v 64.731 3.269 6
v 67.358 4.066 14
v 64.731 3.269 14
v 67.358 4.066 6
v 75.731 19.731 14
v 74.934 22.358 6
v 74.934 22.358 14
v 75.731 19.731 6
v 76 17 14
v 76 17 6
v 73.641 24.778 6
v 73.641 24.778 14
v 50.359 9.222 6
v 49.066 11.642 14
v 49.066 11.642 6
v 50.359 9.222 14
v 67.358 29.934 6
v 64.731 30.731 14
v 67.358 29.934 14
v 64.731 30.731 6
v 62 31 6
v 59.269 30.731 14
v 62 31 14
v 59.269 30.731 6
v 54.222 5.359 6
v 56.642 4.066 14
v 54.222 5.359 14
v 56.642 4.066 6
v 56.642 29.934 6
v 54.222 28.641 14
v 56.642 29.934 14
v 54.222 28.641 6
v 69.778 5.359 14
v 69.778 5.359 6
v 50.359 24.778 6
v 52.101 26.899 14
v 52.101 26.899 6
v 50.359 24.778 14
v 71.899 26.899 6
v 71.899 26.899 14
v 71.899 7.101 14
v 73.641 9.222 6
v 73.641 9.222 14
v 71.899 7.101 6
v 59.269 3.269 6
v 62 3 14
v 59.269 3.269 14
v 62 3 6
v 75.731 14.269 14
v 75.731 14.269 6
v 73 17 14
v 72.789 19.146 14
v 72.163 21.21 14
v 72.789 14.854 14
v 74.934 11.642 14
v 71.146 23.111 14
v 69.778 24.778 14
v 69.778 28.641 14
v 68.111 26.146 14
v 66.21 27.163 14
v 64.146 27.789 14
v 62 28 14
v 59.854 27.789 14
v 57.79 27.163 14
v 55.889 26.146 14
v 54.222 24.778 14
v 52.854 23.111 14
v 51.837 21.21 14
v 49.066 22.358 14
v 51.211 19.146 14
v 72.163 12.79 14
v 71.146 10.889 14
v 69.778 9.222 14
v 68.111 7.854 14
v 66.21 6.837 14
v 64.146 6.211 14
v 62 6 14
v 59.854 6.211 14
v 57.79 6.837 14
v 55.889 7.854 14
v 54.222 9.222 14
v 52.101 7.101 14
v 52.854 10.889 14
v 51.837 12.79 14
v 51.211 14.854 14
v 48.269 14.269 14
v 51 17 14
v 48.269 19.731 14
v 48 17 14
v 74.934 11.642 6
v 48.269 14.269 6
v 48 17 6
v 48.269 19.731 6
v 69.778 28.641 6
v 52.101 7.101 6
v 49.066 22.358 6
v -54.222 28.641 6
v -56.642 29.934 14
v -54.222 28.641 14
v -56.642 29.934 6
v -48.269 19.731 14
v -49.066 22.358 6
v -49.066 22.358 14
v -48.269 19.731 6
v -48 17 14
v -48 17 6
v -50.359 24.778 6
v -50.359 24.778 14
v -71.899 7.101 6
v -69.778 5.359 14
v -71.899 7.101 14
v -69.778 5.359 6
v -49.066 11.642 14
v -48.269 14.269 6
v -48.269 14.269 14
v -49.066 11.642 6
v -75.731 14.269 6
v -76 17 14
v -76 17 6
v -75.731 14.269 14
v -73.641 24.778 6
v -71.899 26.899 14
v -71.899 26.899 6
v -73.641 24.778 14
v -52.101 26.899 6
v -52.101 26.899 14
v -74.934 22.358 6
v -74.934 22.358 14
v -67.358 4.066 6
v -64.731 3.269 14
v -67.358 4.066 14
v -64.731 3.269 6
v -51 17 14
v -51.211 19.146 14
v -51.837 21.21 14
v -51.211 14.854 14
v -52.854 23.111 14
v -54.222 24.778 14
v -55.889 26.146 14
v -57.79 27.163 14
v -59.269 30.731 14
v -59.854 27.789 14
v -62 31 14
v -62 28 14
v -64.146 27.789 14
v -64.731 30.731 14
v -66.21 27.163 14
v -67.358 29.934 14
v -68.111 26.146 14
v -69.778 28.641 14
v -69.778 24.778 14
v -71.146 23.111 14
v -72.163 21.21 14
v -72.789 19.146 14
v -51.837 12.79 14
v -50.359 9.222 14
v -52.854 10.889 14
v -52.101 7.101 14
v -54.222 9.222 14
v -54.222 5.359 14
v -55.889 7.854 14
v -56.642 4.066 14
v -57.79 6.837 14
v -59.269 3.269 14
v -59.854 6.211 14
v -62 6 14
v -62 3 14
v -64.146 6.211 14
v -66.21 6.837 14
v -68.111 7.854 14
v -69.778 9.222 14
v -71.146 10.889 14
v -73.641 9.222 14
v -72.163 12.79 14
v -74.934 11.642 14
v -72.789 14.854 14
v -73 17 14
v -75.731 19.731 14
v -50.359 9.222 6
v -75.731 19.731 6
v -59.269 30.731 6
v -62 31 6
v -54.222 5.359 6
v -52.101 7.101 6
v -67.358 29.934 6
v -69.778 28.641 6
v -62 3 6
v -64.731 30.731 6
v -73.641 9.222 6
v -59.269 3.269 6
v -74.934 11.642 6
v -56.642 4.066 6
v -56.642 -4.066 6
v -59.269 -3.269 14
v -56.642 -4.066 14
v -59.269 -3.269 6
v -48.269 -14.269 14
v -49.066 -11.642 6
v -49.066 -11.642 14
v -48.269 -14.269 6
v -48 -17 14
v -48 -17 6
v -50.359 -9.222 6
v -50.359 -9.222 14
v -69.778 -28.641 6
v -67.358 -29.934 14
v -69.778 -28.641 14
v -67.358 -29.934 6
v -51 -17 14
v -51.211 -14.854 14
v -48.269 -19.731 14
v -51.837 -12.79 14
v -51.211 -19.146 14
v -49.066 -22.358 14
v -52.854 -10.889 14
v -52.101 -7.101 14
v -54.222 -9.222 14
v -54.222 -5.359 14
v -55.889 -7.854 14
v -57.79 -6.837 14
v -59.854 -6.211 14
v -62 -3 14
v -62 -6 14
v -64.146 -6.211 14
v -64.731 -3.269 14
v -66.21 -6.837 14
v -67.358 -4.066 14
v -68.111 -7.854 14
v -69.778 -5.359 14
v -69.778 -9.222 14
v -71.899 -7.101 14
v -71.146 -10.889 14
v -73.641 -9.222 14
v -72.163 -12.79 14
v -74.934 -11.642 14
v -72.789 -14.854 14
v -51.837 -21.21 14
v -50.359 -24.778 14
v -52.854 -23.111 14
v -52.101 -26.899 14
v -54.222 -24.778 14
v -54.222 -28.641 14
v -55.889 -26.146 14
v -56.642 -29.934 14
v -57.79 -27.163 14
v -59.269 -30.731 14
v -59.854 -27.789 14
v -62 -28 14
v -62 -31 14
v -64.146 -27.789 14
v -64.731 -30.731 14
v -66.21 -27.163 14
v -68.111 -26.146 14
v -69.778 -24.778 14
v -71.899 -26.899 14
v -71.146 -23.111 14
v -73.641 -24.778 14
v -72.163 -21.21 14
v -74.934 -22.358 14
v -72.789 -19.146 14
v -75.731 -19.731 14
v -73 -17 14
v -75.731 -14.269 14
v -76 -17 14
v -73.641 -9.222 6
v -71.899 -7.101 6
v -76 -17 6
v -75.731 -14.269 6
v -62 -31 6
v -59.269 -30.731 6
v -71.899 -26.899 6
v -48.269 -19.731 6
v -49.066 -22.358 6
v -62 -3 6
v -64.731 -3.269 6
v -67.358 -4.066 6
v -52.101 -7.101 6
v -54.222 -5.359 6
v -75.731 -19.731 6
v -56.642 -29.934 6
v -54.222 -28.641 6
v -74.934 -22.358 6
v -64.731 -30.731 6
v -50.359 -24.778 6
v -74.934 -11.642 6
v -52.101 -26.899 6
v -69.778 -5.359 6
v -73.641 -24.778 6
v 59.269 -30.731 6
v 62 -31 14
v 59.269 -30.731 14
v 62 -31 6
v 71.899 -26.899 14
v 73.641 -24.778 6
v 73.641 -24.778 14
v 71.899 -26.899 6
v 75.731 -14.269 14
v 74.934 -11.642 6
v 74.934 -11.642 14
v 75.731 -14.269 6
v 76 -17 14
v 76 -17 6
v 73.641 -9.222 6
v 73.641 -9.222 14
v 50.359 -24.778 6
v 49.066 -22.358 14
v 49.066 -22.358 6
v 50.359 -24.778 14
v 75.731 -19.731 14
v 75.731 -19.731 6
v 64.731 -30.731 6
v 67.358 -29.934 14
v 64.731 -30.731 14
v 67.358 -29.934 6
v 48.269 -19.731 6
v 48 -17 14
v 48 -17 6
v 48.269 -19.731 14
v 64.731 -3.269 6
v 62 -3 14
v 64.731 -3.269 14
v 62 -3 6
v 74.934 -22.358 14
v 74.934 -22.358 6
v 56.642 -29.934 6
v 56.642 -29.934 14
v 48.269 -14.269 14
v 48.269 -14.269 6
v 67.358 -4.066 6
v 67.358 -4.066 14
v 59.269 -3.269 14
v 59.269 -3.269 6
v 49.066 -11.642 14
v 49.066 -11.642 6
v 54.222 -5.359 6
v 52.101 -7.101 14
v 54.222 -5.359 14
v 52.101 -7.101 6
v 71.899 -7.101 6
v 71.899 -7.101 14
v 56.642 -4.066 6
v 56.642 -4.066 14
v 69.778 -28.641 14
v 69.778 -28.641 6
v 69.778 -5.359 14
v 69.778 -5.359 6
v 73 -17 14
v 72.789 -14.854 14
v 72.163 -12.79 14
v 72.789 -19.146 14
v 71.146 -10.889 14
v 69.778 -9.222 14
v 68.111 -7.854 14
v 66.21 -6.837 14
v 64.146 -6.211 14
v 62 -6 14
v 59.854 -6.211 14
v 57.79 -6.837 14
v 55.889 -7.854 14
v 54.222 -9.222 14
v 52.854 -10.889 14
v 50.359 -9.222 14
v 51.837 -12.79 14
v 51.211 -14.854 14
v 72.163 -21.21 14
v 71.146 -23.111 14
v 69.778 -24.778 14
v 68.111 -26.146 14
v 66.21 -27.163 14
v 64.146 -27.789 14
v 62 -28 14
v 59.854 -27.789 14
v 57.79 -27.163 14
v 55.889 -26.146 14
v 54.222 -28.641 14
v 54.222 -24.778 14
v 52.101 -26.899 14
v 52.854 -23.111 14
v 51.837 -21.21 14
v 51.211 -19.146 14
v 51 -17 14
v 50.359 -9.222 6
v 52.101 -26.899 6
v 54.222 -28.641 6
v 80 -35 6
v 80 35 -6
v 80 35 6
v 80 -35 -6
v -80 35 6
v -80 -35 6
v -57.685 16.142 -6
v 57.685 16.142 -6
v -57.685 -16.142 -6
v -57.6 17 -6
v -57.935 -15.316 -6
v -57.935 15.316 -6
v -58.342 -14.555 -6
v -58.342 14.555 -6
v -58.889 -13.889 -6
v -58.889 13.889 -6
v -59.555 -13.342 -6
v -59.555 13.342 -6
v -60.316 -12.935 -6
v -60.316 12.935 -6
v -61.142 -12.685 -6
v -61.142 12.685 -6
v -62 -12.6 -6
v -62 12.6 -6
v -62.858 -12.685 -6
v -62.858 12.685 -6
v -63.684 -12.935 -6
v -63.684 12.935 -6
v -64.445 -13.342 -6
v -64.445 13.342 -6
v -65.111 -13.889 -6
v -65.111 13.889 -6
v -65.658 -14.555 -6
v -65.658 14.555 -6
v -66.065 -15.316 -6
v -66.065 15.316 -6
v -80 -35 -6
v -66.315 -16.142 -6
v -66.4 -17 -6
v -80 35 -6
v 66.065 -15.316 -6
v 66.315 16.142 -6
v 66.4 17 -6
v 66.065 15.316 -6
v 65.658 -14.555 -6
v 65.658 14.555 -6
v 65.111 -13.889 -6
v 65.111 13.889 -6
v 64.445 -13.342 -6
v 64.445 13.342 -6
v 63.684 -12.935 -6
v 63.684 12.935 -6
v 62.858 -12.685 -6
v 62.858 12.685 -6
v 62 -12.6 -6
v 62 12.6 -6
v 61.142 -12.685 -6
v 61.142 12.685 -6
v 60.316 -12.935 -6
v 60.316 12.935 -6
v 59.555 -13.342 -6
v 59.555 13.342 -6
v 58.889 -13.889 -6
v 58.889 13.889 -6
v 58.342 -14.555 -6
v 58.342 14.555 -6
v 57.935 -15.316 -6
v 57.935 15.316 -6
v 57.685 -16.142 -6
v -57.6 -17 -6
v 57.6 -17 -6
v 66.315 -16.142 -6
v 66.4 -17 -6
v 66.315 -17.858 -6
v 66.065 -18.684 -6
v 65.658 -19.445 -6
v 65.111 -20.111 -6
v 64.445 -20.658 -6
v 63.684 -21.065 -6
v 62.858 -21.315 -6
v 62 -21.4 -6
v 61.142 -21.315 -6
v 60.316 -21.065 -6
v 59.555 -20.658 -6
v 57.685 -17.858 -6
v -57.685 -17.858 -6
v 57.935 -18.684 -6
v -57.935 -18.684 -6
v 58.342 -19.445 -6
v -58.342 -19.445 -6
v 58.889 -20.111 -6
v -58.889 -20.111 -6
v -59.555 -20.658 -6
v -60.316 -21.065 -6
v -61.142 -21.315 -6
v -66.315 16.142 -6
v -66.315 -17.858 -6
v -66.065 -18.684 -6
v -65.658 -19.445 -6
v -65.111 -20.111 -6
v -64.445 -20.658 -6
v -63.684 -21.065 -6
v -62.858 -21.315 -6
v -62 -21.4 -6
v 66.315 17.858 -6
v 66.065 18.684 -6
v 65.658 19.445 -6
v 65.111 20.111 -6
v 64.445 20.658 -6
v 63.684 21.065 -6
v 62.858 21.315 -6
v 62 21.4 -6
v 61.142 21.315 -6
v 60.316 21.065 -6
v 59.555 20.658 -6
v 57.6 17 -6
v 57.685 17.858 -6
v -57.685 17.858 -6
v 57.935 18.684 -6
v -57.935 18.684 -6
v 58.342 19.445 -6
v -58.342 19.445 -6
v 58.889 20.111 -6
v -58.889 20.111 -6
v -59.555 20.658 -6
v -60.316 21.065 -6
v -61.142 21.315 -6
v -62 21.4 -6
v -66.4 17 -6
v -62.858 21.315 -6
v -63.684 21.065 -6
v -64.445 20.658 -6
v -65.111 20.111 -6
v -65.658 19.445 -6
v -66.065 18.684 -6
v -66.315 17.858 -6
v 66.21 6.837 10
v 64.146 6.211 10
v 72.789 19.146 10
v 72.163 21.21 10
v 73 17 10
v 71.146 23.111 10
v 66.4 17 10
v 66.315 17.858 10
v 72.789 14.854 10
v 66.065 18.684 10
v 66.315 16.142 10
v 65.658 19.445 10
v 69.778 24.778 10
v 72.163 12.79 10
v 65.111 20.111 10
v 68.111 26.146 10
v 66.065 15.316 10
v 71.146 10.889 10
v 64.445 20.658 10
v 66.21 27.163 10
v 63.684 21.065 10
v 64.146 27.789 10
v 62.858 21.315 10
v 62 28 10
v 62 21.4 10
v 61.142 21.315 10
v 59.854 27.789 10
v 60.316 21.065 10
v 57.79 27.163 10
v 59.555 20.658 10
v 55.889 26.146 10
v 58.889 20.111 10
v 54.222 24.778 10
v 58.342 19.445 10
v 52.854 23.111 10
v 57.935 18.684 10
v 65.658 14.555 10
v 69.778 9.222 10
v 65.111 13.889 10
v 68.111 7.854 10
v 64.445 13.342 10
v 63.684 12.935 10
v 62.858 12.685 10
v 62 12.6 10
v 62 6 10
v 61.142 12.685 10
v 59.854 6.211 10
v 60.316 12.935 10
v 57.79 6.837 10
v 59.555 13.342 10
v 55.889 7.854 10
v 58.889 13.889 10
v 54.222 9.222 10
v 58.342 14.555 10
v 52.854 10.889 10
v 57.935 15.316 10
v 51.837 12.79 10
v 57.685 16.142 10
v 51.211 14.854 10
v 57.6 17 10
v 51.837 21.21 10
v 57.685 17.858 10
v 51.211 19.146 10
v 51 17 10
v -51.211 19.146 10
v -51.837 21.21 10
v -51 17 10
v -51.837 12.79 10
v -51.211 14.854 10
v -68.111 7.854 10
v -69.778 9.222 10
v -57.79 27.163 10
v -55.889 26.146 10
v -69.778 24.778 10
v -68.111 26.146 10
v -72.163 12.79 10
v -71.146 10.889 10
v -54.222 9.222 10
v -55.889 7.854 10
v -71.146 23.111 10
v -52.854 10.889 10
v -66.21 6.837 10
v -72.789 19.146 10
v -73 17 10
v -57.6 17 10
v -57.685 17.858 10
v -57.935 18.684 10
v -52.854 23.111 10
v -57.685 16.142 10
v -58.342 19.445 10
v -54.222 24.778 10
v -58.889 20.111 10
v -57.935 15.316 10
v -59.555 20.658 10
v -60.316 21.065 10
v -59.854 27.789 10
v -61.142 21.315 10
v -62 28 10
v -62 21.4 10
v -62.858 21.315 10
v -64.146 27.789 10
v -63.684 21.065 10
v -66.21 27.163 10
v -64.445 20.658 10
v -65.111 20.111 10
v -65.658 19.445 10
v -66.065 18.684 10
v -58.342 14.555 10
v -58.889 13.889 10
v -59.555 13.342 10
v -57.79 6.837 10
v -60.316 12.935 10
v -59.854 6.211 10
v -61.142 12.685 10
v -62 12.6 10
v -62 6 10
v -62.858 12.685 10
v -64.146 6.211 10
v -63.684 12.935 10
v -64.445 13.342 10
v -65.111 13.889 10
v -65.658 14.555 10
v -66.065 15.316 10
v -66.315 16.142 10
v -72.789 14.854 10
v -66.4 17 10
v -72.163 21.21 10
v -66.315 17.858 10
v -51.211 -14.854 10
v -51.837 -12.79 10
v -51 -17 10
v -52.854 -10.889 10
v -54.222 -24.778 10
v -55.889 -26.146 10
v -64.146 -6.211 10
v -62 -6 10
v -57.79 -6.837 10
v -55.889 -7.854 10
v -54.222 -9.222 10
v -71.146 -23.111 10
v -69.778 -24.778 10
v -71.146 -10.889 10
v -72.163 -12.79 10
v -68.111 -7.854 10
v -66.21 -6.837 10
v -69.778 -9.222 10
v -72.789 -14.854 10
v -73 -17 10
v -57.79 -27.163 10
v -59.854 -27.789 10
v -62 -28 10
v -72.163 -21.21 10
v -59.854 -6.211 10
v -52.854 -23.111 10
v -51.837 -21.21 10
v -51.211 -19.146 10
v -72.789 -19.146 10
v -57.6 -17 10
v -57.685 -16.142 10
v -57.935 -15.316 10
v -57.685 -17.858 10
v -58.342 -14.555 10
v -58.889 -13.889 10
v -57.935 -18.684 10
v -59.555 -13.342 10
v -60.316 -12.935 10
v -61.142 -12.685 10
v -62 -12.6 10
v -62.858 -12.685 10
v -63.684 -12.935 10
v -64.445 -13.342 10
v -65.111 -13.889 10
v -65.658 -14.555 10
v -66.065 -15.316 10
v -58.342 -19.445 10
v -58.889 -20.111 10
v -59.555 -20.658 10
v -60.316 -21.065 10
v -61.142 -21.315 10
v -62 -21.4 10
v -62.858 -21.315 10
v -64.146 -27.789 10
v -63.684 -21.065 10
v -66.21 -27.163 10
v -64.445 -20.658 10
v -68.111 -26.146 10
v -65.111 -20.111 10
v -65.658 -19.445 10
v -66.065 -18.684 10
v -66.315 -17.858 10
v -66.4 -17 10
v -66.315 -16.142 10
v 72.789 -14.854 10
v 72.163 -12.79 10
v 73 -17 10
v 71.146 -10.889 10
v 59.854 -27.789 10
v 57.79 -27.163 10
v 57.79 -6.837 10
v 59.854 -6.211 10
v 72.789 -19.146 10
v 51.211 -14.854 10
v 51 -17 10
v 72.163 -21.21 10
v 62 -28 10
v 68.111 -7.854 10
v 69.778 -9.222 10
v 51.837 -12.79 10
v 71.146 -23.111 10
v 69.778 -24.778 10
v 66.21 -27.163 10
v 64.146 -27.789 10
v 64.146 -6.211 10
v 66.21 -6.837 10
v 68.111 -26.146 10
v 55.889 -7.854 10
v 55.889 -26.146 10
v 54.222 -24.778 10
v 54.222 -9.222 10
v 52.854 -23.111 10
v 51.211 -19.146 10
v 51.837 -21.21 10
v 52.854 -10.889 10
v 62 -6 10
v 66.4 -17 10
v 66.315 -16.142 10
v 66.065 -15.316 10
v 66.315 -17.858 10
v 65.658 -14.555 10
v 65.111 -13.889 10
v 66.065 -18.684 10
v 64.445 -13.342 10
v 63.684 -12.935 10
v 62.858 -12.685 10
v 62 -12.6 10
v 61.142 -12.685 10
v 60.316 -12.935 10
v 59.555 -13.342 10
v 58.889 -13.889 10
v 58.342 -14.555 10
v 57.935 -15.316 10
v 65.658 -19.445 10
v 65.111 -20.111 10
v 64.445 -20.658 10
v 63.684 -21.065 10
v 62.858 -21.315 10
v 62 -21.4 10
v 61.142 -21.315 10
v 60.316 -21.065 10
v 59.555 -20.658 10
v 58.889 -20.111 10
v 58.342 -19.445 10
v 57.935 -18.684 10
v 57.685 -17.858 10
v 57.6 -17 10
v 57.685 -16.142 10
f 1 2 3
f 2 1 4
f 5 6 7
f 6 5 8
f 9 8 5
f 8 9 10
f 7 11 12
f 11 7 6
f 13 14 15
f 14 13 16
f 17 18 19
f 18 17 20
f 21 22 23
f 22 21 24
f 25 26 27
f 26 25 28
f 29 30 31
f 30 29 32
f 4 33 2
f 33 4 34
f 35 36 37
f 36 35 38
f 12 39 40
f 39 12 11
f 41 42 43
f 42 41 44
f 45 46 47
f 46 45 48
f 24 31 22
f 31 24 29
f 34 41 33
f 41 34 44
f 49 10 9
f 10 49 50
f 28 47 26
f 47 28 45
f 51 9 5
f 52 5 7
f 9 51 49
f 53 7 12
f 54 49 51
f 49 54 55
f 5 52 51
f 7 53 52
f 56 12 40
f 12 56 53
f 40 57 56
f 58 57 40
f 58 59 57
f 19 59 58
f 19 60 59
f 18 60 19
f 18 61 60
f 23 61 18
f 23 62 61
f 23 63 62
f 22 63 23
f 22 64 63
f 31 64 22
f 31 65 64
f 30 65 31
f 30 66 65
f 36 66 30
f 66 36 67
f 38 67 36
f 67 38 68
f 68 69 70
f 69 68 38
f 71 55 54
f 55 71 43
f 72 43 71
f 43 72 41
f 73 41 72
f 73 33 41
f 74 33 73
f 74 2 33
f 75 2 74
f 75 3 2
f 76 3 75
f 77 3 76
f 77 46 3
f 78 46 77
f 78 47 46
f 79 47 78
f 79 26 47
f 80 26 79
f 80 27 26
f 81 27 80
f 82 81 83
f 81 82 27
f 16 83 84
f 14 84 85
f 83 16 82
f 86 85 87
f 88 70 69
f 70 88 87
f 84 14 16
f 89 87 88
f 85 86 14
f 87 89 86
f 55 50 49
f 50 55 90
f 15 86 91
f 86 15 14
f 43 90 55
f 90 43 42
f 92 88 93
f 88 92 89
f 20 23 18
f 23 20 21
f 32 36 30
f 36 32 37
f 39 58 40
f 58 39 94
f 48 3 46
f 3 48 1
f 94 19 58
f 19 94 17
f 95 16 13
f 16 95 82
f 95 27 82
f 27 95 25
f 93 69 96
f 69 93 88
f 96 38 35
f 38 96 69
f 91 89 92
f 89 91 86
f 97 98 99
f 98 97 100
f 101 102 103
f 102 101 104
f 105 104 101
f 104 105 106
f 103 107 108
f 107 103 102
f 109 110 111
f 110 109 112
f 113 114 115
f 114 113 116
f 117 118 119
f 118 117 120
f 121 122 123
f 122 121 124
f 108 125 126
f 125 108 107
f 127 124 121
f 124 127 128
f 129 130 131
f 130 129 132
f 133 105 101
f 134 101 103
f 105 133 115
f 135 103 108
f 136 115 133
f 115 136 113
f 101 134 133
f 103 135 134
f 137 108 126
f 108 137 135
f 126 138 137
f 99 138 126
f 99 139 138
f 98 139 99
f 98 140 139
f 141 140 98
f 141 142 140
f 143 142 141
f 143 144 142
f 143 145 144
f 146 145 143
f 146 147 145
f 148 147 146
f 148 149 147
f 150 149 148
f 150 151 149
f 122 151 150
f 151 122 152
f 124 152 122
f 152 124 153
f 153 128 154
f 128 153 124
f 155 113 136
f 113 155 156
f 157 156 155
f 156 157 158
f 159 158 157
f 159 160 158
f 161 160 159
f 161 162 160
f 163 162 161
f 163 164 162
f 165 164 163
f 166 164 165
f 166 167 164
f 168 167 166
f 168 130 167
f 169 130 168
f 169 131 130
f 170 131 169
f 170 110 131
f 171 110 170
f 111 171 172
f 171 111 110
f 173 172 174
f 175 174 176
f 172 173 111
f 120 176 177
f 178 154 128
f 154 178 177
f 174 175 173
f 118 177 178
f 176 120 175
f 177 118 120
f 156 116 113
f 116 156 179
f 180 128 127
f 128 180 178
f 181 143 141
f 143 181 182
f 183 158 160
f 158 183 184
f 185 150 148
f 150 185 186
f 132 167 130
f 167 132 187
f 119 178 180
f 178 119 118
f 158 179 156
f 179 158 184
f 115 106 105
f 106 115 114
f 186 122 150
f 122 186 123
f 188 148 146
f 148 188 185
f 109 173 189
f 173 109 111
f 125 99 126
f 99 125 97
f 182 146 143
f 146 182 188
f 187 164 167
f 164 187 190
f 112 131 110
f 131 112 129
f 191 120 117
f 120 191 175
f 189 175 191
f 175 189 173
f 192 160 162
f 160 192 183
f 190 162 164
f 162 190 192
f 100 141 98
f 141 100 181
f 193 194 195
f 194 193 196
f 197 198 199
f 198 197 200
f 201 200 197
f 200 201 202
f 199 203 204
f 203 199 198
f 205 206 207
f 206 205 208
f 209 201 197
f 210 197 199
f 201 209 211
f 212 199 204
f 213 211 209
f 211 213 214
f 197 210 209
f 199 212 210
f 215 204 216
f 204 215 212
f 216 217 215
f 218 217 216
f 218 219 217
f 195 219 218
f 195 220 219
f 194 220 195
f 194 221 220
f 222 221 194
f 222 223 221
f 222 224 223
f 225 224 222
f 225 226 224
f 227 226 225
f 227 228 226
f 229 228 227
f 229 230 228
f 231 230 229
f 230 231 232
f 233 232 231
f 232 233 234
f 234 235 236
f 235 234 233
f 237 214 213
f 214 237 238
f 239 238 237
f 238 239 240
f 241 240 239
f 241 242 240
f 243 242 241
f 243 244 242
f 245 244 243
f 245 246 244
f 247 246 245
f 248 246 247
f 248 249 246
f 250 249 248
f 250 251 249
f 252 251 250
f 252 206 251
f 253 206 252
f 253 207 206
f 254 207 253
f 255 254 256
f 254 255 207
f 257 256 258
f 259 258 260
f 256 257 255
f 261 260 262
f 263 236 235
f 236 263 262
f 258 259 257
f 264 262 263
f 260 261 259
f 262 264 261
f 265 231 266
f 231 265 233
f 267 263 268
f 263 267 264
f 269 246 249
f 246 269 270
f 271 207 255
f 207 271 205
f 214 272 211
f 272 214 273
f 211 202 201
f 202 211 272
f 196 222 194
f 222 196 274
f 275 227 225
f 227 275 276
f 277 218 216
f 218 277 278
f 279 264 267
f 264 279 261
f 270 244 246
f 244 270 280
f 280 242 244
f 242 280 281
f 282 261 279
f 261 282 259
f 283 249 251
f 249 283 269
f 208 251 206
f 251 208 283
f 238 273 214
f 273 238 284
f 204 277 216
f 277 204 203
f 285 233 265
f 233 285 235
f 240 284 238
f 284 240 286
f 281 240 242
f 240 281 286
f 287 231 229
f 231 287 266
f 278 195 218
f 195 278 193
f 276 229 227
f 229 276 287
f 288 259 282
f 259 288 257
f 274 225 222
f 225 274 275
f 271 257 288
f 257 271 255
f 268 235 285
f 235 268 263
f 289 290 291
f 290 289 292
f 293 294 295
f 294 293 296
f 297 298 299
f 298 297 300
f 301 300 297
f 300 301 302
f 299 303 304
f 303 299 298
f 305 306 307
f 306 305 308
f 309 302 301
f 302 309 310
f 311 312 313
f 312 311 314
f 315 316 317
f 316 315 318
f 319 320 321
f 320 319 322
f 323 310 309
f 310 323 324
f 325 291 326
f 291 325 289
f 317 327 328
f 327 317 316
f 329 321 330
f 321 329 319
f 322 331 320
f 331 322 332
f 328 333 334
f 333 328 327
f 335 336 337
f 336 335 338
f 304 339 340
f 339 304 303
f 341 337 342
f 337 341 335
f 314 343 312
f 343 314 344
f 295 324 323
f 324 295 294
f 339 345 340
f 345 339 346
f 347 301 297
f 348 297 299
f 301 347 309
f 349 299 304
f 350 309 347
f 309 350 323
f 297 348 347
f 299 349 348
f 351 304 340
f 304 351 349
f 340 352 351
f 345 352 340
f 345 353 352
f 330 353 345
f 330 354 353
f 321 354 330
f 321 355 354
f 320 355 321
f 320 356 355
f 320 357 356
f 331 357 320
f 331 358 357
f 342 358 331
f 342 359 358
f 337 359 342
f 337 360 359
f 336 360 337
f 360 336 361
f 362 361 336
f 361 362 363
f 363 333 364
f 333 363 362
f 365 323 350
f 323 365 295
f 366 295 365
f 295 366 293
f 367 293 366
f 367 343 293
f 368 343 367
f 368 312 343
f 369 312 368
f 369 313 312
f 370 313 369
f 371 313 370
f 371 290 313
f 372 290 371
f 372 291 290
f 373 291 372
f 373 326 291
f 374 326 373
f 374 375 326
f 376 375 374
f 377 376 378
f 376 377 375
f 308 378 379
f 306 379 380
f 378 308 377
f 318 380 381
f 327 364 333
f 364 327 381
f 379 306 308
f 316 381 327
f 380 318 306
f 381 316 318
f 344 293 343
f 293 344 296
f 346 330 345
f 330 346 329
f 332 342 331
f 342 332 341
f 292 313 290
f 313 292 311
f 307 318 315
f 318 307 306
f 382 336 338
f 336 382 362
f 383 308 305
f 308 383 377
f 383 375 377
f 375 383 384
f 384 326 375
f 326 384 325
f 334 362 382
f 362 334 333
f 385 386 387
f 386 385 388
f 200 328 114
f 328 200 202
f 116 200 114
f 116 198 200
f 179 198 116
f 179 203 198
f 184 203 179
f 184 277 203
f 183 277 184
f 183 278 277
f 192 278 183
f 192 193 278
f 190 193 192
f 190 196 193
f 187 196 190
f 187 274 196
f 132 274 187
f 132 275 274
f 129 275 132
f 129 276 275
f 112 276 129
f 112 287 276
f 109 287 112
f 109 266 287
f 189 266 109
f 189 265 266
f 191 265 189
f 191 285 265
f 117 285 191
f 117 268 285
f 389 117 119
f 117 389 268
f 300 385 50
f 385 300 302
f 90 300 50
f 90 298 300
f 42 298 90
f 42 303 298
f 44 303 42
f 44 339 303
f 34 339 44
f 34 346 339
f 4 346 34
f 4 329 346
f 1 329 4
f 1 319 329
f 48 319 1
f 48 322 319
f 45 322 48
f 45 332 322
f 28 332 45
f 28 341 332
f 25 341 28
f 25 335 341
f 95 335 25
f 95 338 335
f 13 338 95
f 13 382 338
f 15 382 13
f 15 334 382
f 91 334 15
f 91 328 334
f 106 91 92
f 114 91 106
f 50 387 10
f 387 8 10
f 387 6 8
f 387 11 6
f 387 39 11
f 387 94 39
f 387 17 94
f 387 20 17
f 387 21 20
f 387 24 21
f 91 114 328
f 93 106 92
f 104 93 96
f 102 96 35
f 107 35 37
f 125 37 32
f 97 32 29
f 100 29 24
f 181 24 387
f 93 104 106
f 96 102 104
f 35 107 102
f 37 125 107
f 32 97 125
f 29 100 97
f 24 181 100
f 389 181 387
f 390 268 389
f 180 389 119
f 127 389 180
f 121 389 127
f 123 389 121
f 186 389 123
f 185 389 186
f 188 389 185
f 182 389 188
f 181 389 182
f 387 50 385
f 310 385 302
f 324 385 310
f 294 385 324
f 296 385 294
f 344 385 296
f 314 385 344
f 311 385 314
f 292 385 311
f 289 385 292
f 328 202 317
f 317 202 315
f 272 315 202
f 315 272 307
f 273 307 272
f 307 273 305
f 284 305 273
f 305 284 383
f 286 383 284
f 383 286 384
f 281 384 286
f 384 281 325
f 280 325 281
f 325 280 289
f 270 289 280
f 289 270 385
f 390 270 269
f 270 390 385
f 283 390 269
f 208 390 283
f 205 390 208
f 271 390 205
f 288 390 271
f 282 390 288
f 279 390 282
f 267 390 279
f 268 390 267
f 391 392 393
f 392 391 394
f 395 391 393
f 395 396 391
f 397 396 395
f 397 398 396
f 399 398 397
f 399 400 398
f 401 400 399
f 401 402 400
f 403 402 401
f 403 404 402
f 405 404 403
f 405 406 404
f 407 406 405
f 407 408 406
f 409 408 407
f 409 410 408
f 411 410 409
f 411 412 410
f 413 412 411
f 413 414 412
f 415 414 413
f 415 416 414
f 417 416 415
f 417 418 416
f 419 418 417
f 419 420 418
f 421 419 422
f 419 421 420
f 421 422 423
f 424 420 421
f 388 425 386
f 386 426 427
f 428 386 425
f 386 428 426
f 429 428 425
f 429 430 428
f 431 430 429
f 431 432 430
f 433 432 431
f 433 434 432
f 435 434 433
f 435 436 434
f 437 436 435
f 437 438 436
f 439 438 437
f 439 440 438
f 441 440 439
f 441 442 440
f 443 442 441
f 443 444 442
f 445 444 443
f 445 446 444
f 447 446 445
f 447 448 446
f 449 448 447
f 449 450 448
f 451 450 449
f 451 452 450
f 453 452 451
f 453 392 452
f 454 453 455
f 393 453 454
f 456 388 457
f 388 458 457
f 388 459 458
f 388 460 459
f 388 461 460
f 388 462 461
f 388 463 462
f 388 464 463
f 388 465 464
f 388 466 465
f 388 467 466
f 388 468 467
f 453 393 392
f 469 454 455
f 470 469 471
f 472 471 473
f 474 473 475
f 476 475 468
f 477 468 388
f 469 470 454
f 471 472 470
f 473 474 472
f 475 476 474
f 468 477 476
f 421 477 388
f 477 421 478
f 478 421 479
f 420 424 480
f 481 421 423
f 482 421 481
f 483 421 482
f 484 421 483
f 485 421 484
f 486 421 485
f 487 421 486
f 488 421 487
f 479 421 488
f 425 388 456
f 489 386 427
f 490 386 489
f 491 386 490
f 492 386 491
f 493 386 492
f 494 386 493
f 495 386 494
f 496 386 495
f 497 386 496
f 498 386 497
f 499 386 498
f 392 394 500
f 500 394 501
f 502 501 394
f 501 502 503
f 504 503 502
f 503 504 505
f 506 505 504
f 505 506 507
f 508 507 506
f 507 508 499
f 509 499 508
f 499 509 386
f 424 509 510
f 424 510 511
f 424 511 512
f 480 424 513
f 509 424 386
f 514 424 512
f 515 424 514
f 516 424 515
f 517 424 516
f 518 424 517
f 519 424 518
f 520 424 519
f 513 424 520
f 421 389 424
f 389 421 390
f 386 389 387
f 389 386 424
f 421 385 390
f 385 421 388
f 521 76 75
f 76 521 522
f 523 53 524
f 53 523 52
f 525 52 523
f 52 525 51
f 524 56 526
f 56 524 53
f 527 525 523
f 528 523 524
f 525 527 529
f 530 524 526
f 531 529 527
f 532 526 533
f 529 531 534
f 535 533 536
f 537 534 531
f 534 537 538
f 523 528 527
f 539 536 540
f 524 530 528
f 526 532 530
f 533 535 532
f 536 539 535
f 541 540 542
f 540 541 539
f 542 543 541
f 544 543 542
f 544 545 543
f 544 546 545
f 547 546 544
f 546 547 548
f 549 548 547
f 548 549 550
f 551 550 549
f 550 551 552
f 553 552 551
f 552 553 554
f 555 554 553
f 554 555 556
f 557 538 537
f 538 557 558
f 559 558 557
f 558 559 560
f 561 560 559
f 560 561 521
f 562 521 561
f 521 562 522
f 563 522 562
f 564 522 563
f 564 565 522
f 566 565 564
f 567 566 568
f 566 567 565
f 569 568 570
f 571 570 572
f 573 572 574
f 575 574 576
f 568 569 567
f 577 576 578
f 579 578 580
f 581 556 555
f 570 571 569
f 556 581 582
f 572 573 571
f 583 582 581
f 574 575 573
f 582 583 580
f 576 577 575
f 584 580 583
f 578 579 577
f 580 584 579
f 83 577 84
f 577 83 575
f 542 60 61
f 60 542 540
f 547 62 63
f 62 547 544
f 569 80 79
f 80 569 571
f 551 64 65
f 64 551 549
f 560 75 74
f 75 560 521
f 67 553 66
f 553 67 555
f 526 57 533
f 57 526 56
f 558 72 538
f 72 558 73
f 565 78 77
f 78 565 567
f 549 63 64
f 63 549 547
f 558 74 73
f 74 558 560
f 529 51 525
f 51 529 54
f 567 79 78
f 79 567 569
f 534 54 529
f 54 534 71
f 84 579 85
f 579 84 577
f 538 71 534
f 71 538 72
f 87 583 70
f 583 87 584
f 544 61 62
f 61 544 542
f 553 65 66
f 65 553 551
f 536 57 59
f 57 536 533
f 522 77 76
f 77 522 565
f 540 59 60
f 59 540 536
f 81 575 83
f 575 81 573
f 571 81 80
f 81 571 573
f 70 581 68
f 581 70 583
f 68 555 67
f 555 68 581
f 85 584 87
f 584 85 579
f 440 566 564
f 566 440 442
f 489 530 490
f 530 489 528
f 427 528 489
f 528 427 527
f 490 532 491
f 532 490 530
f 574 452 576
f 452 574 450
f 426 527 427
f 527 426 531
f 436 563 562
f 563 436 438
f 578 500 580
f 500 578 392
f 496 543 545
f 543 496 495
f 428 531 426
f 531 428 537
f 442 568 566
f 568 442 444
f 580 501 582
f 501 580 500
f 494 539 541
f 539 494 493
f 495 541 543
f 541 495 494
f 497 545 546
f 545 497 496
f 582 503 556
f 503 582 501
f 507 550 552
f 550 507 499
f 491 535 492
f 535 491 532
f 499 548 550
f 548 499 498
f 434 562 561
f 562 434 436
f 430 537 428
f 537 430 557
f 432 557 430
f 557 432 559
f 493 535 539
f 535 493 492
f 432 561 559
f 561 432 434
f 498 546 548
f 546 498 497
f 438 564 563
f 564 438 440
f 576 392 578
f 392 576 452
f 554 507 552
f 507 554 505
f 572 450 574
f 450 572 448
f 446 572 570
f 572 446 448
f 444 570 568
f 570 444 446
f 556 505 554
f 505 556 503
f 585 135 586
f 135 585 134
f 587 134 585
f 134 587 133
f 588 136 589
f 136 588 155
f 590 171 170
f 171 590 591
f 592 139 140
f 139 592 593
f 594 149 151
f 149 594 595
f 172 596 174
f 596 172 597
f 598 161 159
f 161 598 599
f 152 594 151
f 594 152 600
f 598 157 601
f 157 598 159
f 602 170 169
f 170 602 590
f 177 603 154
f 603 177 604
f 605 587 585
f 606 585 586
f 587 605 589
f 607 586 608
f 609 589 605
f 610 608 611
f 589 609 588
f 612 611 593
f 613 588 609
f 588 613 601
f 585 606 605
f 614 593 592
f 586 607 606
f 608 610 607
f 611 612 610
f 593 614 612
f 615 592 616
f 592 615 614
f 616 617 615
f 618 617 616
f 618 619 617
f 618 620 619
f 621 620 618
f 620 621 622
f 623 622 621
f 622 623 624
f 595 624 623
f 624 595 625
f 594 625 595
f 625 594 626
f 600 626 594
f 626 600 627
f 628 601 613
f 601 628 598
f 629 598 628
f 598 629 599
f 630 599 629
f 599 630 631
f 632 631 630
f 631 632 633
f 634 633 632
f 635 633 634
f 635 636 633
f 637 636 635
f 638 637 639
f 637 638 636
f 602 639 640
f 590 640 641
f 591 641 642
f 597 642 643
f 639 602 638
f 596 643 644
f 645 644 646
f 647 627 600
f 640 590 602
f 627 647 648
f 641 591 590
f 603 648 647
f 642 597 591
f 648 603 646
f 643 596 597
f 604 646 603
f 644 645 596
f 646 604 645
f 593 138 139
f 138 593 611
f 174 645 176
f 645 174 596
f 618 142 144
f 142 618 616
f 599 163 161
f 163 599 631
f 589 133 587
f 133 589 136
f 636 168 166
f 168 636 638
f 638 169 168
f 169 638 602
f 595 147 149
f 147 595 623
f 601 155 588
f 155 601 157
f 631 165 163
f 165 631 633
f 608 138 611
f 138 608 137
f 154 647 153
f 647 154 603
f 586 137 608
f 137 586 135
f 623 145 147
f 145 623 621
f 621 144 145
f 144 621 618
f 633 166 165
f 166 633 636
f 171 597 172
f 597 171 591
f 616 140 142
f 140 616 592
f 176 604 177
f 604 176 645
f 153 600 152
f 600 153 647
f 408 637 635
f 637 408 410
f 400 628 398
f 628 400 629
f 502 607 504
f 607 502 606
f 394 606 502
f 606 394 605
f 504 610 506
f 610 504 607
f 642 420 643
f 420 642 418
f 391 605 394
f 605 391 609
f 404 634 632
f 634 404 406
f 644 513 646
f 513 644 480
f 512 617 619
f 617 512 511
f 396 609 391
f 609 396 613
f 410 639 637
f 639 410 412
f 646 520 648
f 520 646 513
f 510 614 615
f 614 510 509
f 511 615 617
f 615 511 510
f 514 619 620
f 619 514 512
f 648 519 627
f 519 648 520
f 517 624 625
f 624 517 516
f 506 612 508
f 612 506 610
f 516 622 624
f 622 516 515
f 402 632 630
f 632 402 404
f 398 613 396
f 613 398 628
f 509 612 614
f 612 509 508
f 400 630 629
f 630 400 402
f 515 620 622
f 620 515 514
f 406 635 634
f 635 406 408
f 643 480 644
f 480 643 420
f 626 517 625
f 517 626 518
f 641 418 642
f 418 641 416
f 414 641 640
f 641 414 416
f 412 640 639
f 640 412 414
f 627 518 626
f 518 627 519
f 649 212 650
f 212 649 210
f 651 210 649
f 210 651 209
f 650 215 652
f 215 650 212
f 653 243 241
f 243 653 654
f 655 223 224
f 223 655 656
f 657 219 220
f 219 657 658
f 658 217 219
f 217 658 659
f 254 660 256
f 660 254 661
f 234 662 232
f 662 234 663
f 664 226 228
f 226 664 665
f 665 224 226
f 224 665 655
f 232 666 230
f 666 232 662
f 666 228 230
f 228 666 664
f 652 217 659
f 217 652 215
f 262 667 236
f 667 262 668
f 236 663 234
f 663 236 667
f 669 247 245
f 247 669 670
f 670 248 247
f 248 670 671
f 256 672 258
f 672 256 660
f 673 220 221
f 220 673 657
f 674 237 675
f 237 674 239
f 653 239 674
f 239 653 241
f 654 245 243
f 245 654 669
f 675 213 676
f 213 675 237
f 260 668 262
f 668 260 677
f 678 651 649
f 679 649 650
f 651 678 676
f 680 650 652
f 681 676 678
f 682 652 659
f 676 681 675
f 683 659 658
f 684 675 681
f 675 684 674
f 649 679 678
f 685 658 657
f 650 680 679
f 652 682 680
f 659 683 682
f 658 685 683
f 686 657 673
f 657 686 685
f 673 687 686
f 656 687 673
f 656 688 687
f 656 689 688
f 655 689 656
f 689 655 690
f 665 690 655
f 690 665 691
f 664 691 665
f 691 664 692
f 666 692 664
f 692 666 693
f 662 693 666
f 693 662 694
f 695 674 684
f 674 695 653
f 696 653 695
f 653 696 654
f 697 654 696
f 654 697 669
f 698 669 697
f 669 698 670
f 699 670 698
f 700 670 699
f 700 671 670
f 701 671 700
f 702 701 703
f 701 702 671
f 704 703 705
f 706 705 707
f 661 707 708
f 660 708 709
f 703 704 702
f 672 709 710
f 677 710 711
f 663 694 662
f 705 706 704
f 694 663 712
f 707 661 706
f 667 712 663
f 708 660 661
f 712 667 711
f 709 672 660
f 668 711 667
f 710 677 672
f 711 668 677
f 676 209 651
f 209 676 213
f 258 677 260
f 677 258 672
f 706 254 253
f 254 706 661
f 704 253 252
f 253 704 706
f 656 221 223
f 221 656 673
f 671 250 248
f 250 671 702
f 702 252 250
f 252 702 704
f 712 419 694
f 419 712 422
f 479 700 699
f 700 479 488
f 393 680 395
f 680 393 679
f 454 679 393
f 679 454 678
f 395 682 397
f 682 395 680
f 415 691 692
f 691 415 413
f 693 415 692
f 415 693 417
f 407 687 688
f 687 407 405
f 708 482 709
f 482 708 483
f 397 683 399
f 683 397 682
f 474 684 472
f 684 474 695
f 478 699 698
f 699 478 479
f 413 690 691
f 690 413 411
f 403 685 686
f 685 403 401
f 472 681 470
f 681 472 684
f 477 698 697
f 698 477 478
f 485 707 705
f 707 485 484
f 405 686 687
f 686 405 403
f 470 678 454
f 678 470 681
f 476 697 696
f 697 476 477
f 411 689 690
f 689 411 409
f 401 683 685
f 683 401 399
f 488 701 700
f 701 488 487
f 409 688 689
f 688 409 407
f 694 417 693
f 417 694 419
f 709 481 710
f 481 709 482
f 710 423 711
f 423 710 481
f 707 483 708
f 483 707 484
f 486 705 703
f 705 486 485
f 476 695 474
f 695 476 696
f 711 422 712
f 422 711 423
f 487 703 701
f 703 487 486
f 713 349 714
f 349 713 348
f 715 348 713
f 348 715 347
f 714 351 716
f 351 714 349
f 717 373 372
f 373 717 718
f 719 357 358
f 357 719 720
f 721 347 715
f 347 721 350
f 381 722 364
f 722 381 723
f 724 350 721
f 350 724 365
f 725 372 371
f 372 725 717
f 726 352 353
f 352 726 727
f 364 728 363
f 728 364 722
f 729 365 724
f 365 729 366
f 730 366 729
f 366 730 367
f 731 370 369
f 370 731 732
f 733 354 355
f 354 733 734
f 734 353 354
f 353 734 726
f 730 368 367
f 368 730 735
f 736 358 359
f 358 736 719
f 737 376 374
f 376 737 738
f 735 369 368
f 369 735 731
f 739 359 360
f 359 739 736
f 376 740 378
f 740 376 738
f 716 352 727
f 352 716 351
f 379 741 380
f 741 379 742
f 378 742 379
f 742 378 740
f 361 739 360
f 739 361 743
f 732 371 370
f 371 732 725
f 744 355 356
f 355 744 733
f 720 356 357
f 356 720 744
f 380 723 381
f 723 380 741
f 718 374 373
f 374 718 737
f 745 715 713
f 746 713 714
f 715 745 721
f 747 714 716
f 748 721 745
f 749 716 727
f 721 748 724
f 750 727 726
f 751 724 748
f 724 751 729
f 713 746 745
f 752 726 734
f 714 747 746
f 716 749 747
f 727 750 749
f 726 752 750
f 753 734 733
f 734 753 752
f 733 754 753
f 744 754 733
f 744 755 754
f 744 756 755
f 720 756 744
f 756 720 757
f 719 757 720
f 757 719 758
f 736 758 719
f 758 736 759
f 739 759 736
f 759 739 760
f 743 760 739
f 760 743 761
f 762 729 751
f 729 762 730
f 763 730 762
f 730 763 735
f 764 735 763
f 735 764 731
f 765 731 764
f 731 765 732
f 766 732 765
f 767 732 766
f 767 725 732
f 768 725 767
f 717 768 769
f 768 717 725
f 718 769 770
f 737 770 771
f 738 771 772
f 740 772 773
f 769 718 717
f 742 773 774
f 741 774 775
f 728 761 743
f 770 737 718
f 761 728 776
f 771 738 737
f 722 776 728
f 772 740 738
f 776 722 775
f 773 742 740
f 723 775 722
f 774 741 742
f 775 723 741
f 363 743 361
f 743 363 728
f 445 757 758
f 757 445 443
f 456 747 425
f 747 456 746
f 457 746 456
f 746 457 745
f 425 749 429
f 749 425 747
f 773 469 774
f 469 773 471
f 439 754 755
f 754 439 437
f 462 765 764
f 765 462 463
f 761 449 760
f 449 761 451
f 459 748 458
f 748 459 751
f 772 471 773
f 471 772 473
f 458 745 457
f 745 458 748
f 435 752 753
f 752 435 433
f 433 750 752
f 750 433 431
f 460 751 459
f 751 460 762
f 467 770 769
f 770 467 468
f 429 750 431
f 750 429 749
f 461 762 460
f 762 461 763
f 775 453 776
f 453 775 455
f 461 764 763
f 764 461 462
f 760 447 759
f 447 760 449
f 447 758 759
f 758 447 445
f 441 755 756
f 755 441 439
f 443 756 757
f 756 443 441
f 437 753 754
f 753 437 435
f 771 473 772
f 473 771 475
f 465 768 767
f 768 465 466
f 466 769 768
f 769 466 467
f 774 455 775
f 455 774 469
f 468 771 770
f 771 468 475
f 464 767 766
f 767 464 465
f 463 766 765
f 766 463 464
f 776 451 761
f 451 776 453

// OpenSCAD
$fn = 32;

// ----------------------------------------------------------------------
// Socket pad plate
// bosses with counterbored sockets for the screws
// ----------------------------------------------------------------------

// --- parameters (mm) ---
base_t = 12;            // base plate thickness
boss_h = 8;             // boss height above the base plate
boss_d = 28;            // boss diameter
socket_d = 22;          // socket diameter
socket_depth = 4;       // socket depth from the boss face
bolt_d = 8.8;           // screw clearance hole through the socket floor
plate = [160, 70, 12];  // overall size (x, y, z)
edge = 18;              // boss centre offset from the plate edge
pads = 4;               // boss count, one per corner

// --- derived feature positions (mm) ---
height = base_t + boss_h;        // = 20   overall height of the part
corner_x = plate[0] / 2 - edge;  // = 62   boss centre X
corner_y = plate[1] / 2 - edge;  // = 17   boss centre Y
feature_centers = [
  [corner_x, corner_y],
  [-corner_x, corner_y],
  [-corner_x, -corner_y],
  [corner_x, -corner_y]
];   // boss centres: sockets, holes and the pads themselves are placed from here

// base plate, bosses on feature_centers, socket + through hole in each
difference() {
  union() {
    cube(plate, center = true);
    for (centre = feature_centers)
      translate([centre[0], centre[1], plate[2] / 2 - 1])
        cylinder(d = boss_d, h = boss_h + 1);
  }
  for (centre = feature_centers) {
    translate([centre[0], centre[1], plate[2] / 2 + boss_h - socket_depth])
      cylinder(d = socket_d, h = socket_depth + 1);
    translate([centre[0], centre[1], -height])
      cylinder(d = bolt_d, h = 2 * height + 2);  // through the socket floor
  }
}
